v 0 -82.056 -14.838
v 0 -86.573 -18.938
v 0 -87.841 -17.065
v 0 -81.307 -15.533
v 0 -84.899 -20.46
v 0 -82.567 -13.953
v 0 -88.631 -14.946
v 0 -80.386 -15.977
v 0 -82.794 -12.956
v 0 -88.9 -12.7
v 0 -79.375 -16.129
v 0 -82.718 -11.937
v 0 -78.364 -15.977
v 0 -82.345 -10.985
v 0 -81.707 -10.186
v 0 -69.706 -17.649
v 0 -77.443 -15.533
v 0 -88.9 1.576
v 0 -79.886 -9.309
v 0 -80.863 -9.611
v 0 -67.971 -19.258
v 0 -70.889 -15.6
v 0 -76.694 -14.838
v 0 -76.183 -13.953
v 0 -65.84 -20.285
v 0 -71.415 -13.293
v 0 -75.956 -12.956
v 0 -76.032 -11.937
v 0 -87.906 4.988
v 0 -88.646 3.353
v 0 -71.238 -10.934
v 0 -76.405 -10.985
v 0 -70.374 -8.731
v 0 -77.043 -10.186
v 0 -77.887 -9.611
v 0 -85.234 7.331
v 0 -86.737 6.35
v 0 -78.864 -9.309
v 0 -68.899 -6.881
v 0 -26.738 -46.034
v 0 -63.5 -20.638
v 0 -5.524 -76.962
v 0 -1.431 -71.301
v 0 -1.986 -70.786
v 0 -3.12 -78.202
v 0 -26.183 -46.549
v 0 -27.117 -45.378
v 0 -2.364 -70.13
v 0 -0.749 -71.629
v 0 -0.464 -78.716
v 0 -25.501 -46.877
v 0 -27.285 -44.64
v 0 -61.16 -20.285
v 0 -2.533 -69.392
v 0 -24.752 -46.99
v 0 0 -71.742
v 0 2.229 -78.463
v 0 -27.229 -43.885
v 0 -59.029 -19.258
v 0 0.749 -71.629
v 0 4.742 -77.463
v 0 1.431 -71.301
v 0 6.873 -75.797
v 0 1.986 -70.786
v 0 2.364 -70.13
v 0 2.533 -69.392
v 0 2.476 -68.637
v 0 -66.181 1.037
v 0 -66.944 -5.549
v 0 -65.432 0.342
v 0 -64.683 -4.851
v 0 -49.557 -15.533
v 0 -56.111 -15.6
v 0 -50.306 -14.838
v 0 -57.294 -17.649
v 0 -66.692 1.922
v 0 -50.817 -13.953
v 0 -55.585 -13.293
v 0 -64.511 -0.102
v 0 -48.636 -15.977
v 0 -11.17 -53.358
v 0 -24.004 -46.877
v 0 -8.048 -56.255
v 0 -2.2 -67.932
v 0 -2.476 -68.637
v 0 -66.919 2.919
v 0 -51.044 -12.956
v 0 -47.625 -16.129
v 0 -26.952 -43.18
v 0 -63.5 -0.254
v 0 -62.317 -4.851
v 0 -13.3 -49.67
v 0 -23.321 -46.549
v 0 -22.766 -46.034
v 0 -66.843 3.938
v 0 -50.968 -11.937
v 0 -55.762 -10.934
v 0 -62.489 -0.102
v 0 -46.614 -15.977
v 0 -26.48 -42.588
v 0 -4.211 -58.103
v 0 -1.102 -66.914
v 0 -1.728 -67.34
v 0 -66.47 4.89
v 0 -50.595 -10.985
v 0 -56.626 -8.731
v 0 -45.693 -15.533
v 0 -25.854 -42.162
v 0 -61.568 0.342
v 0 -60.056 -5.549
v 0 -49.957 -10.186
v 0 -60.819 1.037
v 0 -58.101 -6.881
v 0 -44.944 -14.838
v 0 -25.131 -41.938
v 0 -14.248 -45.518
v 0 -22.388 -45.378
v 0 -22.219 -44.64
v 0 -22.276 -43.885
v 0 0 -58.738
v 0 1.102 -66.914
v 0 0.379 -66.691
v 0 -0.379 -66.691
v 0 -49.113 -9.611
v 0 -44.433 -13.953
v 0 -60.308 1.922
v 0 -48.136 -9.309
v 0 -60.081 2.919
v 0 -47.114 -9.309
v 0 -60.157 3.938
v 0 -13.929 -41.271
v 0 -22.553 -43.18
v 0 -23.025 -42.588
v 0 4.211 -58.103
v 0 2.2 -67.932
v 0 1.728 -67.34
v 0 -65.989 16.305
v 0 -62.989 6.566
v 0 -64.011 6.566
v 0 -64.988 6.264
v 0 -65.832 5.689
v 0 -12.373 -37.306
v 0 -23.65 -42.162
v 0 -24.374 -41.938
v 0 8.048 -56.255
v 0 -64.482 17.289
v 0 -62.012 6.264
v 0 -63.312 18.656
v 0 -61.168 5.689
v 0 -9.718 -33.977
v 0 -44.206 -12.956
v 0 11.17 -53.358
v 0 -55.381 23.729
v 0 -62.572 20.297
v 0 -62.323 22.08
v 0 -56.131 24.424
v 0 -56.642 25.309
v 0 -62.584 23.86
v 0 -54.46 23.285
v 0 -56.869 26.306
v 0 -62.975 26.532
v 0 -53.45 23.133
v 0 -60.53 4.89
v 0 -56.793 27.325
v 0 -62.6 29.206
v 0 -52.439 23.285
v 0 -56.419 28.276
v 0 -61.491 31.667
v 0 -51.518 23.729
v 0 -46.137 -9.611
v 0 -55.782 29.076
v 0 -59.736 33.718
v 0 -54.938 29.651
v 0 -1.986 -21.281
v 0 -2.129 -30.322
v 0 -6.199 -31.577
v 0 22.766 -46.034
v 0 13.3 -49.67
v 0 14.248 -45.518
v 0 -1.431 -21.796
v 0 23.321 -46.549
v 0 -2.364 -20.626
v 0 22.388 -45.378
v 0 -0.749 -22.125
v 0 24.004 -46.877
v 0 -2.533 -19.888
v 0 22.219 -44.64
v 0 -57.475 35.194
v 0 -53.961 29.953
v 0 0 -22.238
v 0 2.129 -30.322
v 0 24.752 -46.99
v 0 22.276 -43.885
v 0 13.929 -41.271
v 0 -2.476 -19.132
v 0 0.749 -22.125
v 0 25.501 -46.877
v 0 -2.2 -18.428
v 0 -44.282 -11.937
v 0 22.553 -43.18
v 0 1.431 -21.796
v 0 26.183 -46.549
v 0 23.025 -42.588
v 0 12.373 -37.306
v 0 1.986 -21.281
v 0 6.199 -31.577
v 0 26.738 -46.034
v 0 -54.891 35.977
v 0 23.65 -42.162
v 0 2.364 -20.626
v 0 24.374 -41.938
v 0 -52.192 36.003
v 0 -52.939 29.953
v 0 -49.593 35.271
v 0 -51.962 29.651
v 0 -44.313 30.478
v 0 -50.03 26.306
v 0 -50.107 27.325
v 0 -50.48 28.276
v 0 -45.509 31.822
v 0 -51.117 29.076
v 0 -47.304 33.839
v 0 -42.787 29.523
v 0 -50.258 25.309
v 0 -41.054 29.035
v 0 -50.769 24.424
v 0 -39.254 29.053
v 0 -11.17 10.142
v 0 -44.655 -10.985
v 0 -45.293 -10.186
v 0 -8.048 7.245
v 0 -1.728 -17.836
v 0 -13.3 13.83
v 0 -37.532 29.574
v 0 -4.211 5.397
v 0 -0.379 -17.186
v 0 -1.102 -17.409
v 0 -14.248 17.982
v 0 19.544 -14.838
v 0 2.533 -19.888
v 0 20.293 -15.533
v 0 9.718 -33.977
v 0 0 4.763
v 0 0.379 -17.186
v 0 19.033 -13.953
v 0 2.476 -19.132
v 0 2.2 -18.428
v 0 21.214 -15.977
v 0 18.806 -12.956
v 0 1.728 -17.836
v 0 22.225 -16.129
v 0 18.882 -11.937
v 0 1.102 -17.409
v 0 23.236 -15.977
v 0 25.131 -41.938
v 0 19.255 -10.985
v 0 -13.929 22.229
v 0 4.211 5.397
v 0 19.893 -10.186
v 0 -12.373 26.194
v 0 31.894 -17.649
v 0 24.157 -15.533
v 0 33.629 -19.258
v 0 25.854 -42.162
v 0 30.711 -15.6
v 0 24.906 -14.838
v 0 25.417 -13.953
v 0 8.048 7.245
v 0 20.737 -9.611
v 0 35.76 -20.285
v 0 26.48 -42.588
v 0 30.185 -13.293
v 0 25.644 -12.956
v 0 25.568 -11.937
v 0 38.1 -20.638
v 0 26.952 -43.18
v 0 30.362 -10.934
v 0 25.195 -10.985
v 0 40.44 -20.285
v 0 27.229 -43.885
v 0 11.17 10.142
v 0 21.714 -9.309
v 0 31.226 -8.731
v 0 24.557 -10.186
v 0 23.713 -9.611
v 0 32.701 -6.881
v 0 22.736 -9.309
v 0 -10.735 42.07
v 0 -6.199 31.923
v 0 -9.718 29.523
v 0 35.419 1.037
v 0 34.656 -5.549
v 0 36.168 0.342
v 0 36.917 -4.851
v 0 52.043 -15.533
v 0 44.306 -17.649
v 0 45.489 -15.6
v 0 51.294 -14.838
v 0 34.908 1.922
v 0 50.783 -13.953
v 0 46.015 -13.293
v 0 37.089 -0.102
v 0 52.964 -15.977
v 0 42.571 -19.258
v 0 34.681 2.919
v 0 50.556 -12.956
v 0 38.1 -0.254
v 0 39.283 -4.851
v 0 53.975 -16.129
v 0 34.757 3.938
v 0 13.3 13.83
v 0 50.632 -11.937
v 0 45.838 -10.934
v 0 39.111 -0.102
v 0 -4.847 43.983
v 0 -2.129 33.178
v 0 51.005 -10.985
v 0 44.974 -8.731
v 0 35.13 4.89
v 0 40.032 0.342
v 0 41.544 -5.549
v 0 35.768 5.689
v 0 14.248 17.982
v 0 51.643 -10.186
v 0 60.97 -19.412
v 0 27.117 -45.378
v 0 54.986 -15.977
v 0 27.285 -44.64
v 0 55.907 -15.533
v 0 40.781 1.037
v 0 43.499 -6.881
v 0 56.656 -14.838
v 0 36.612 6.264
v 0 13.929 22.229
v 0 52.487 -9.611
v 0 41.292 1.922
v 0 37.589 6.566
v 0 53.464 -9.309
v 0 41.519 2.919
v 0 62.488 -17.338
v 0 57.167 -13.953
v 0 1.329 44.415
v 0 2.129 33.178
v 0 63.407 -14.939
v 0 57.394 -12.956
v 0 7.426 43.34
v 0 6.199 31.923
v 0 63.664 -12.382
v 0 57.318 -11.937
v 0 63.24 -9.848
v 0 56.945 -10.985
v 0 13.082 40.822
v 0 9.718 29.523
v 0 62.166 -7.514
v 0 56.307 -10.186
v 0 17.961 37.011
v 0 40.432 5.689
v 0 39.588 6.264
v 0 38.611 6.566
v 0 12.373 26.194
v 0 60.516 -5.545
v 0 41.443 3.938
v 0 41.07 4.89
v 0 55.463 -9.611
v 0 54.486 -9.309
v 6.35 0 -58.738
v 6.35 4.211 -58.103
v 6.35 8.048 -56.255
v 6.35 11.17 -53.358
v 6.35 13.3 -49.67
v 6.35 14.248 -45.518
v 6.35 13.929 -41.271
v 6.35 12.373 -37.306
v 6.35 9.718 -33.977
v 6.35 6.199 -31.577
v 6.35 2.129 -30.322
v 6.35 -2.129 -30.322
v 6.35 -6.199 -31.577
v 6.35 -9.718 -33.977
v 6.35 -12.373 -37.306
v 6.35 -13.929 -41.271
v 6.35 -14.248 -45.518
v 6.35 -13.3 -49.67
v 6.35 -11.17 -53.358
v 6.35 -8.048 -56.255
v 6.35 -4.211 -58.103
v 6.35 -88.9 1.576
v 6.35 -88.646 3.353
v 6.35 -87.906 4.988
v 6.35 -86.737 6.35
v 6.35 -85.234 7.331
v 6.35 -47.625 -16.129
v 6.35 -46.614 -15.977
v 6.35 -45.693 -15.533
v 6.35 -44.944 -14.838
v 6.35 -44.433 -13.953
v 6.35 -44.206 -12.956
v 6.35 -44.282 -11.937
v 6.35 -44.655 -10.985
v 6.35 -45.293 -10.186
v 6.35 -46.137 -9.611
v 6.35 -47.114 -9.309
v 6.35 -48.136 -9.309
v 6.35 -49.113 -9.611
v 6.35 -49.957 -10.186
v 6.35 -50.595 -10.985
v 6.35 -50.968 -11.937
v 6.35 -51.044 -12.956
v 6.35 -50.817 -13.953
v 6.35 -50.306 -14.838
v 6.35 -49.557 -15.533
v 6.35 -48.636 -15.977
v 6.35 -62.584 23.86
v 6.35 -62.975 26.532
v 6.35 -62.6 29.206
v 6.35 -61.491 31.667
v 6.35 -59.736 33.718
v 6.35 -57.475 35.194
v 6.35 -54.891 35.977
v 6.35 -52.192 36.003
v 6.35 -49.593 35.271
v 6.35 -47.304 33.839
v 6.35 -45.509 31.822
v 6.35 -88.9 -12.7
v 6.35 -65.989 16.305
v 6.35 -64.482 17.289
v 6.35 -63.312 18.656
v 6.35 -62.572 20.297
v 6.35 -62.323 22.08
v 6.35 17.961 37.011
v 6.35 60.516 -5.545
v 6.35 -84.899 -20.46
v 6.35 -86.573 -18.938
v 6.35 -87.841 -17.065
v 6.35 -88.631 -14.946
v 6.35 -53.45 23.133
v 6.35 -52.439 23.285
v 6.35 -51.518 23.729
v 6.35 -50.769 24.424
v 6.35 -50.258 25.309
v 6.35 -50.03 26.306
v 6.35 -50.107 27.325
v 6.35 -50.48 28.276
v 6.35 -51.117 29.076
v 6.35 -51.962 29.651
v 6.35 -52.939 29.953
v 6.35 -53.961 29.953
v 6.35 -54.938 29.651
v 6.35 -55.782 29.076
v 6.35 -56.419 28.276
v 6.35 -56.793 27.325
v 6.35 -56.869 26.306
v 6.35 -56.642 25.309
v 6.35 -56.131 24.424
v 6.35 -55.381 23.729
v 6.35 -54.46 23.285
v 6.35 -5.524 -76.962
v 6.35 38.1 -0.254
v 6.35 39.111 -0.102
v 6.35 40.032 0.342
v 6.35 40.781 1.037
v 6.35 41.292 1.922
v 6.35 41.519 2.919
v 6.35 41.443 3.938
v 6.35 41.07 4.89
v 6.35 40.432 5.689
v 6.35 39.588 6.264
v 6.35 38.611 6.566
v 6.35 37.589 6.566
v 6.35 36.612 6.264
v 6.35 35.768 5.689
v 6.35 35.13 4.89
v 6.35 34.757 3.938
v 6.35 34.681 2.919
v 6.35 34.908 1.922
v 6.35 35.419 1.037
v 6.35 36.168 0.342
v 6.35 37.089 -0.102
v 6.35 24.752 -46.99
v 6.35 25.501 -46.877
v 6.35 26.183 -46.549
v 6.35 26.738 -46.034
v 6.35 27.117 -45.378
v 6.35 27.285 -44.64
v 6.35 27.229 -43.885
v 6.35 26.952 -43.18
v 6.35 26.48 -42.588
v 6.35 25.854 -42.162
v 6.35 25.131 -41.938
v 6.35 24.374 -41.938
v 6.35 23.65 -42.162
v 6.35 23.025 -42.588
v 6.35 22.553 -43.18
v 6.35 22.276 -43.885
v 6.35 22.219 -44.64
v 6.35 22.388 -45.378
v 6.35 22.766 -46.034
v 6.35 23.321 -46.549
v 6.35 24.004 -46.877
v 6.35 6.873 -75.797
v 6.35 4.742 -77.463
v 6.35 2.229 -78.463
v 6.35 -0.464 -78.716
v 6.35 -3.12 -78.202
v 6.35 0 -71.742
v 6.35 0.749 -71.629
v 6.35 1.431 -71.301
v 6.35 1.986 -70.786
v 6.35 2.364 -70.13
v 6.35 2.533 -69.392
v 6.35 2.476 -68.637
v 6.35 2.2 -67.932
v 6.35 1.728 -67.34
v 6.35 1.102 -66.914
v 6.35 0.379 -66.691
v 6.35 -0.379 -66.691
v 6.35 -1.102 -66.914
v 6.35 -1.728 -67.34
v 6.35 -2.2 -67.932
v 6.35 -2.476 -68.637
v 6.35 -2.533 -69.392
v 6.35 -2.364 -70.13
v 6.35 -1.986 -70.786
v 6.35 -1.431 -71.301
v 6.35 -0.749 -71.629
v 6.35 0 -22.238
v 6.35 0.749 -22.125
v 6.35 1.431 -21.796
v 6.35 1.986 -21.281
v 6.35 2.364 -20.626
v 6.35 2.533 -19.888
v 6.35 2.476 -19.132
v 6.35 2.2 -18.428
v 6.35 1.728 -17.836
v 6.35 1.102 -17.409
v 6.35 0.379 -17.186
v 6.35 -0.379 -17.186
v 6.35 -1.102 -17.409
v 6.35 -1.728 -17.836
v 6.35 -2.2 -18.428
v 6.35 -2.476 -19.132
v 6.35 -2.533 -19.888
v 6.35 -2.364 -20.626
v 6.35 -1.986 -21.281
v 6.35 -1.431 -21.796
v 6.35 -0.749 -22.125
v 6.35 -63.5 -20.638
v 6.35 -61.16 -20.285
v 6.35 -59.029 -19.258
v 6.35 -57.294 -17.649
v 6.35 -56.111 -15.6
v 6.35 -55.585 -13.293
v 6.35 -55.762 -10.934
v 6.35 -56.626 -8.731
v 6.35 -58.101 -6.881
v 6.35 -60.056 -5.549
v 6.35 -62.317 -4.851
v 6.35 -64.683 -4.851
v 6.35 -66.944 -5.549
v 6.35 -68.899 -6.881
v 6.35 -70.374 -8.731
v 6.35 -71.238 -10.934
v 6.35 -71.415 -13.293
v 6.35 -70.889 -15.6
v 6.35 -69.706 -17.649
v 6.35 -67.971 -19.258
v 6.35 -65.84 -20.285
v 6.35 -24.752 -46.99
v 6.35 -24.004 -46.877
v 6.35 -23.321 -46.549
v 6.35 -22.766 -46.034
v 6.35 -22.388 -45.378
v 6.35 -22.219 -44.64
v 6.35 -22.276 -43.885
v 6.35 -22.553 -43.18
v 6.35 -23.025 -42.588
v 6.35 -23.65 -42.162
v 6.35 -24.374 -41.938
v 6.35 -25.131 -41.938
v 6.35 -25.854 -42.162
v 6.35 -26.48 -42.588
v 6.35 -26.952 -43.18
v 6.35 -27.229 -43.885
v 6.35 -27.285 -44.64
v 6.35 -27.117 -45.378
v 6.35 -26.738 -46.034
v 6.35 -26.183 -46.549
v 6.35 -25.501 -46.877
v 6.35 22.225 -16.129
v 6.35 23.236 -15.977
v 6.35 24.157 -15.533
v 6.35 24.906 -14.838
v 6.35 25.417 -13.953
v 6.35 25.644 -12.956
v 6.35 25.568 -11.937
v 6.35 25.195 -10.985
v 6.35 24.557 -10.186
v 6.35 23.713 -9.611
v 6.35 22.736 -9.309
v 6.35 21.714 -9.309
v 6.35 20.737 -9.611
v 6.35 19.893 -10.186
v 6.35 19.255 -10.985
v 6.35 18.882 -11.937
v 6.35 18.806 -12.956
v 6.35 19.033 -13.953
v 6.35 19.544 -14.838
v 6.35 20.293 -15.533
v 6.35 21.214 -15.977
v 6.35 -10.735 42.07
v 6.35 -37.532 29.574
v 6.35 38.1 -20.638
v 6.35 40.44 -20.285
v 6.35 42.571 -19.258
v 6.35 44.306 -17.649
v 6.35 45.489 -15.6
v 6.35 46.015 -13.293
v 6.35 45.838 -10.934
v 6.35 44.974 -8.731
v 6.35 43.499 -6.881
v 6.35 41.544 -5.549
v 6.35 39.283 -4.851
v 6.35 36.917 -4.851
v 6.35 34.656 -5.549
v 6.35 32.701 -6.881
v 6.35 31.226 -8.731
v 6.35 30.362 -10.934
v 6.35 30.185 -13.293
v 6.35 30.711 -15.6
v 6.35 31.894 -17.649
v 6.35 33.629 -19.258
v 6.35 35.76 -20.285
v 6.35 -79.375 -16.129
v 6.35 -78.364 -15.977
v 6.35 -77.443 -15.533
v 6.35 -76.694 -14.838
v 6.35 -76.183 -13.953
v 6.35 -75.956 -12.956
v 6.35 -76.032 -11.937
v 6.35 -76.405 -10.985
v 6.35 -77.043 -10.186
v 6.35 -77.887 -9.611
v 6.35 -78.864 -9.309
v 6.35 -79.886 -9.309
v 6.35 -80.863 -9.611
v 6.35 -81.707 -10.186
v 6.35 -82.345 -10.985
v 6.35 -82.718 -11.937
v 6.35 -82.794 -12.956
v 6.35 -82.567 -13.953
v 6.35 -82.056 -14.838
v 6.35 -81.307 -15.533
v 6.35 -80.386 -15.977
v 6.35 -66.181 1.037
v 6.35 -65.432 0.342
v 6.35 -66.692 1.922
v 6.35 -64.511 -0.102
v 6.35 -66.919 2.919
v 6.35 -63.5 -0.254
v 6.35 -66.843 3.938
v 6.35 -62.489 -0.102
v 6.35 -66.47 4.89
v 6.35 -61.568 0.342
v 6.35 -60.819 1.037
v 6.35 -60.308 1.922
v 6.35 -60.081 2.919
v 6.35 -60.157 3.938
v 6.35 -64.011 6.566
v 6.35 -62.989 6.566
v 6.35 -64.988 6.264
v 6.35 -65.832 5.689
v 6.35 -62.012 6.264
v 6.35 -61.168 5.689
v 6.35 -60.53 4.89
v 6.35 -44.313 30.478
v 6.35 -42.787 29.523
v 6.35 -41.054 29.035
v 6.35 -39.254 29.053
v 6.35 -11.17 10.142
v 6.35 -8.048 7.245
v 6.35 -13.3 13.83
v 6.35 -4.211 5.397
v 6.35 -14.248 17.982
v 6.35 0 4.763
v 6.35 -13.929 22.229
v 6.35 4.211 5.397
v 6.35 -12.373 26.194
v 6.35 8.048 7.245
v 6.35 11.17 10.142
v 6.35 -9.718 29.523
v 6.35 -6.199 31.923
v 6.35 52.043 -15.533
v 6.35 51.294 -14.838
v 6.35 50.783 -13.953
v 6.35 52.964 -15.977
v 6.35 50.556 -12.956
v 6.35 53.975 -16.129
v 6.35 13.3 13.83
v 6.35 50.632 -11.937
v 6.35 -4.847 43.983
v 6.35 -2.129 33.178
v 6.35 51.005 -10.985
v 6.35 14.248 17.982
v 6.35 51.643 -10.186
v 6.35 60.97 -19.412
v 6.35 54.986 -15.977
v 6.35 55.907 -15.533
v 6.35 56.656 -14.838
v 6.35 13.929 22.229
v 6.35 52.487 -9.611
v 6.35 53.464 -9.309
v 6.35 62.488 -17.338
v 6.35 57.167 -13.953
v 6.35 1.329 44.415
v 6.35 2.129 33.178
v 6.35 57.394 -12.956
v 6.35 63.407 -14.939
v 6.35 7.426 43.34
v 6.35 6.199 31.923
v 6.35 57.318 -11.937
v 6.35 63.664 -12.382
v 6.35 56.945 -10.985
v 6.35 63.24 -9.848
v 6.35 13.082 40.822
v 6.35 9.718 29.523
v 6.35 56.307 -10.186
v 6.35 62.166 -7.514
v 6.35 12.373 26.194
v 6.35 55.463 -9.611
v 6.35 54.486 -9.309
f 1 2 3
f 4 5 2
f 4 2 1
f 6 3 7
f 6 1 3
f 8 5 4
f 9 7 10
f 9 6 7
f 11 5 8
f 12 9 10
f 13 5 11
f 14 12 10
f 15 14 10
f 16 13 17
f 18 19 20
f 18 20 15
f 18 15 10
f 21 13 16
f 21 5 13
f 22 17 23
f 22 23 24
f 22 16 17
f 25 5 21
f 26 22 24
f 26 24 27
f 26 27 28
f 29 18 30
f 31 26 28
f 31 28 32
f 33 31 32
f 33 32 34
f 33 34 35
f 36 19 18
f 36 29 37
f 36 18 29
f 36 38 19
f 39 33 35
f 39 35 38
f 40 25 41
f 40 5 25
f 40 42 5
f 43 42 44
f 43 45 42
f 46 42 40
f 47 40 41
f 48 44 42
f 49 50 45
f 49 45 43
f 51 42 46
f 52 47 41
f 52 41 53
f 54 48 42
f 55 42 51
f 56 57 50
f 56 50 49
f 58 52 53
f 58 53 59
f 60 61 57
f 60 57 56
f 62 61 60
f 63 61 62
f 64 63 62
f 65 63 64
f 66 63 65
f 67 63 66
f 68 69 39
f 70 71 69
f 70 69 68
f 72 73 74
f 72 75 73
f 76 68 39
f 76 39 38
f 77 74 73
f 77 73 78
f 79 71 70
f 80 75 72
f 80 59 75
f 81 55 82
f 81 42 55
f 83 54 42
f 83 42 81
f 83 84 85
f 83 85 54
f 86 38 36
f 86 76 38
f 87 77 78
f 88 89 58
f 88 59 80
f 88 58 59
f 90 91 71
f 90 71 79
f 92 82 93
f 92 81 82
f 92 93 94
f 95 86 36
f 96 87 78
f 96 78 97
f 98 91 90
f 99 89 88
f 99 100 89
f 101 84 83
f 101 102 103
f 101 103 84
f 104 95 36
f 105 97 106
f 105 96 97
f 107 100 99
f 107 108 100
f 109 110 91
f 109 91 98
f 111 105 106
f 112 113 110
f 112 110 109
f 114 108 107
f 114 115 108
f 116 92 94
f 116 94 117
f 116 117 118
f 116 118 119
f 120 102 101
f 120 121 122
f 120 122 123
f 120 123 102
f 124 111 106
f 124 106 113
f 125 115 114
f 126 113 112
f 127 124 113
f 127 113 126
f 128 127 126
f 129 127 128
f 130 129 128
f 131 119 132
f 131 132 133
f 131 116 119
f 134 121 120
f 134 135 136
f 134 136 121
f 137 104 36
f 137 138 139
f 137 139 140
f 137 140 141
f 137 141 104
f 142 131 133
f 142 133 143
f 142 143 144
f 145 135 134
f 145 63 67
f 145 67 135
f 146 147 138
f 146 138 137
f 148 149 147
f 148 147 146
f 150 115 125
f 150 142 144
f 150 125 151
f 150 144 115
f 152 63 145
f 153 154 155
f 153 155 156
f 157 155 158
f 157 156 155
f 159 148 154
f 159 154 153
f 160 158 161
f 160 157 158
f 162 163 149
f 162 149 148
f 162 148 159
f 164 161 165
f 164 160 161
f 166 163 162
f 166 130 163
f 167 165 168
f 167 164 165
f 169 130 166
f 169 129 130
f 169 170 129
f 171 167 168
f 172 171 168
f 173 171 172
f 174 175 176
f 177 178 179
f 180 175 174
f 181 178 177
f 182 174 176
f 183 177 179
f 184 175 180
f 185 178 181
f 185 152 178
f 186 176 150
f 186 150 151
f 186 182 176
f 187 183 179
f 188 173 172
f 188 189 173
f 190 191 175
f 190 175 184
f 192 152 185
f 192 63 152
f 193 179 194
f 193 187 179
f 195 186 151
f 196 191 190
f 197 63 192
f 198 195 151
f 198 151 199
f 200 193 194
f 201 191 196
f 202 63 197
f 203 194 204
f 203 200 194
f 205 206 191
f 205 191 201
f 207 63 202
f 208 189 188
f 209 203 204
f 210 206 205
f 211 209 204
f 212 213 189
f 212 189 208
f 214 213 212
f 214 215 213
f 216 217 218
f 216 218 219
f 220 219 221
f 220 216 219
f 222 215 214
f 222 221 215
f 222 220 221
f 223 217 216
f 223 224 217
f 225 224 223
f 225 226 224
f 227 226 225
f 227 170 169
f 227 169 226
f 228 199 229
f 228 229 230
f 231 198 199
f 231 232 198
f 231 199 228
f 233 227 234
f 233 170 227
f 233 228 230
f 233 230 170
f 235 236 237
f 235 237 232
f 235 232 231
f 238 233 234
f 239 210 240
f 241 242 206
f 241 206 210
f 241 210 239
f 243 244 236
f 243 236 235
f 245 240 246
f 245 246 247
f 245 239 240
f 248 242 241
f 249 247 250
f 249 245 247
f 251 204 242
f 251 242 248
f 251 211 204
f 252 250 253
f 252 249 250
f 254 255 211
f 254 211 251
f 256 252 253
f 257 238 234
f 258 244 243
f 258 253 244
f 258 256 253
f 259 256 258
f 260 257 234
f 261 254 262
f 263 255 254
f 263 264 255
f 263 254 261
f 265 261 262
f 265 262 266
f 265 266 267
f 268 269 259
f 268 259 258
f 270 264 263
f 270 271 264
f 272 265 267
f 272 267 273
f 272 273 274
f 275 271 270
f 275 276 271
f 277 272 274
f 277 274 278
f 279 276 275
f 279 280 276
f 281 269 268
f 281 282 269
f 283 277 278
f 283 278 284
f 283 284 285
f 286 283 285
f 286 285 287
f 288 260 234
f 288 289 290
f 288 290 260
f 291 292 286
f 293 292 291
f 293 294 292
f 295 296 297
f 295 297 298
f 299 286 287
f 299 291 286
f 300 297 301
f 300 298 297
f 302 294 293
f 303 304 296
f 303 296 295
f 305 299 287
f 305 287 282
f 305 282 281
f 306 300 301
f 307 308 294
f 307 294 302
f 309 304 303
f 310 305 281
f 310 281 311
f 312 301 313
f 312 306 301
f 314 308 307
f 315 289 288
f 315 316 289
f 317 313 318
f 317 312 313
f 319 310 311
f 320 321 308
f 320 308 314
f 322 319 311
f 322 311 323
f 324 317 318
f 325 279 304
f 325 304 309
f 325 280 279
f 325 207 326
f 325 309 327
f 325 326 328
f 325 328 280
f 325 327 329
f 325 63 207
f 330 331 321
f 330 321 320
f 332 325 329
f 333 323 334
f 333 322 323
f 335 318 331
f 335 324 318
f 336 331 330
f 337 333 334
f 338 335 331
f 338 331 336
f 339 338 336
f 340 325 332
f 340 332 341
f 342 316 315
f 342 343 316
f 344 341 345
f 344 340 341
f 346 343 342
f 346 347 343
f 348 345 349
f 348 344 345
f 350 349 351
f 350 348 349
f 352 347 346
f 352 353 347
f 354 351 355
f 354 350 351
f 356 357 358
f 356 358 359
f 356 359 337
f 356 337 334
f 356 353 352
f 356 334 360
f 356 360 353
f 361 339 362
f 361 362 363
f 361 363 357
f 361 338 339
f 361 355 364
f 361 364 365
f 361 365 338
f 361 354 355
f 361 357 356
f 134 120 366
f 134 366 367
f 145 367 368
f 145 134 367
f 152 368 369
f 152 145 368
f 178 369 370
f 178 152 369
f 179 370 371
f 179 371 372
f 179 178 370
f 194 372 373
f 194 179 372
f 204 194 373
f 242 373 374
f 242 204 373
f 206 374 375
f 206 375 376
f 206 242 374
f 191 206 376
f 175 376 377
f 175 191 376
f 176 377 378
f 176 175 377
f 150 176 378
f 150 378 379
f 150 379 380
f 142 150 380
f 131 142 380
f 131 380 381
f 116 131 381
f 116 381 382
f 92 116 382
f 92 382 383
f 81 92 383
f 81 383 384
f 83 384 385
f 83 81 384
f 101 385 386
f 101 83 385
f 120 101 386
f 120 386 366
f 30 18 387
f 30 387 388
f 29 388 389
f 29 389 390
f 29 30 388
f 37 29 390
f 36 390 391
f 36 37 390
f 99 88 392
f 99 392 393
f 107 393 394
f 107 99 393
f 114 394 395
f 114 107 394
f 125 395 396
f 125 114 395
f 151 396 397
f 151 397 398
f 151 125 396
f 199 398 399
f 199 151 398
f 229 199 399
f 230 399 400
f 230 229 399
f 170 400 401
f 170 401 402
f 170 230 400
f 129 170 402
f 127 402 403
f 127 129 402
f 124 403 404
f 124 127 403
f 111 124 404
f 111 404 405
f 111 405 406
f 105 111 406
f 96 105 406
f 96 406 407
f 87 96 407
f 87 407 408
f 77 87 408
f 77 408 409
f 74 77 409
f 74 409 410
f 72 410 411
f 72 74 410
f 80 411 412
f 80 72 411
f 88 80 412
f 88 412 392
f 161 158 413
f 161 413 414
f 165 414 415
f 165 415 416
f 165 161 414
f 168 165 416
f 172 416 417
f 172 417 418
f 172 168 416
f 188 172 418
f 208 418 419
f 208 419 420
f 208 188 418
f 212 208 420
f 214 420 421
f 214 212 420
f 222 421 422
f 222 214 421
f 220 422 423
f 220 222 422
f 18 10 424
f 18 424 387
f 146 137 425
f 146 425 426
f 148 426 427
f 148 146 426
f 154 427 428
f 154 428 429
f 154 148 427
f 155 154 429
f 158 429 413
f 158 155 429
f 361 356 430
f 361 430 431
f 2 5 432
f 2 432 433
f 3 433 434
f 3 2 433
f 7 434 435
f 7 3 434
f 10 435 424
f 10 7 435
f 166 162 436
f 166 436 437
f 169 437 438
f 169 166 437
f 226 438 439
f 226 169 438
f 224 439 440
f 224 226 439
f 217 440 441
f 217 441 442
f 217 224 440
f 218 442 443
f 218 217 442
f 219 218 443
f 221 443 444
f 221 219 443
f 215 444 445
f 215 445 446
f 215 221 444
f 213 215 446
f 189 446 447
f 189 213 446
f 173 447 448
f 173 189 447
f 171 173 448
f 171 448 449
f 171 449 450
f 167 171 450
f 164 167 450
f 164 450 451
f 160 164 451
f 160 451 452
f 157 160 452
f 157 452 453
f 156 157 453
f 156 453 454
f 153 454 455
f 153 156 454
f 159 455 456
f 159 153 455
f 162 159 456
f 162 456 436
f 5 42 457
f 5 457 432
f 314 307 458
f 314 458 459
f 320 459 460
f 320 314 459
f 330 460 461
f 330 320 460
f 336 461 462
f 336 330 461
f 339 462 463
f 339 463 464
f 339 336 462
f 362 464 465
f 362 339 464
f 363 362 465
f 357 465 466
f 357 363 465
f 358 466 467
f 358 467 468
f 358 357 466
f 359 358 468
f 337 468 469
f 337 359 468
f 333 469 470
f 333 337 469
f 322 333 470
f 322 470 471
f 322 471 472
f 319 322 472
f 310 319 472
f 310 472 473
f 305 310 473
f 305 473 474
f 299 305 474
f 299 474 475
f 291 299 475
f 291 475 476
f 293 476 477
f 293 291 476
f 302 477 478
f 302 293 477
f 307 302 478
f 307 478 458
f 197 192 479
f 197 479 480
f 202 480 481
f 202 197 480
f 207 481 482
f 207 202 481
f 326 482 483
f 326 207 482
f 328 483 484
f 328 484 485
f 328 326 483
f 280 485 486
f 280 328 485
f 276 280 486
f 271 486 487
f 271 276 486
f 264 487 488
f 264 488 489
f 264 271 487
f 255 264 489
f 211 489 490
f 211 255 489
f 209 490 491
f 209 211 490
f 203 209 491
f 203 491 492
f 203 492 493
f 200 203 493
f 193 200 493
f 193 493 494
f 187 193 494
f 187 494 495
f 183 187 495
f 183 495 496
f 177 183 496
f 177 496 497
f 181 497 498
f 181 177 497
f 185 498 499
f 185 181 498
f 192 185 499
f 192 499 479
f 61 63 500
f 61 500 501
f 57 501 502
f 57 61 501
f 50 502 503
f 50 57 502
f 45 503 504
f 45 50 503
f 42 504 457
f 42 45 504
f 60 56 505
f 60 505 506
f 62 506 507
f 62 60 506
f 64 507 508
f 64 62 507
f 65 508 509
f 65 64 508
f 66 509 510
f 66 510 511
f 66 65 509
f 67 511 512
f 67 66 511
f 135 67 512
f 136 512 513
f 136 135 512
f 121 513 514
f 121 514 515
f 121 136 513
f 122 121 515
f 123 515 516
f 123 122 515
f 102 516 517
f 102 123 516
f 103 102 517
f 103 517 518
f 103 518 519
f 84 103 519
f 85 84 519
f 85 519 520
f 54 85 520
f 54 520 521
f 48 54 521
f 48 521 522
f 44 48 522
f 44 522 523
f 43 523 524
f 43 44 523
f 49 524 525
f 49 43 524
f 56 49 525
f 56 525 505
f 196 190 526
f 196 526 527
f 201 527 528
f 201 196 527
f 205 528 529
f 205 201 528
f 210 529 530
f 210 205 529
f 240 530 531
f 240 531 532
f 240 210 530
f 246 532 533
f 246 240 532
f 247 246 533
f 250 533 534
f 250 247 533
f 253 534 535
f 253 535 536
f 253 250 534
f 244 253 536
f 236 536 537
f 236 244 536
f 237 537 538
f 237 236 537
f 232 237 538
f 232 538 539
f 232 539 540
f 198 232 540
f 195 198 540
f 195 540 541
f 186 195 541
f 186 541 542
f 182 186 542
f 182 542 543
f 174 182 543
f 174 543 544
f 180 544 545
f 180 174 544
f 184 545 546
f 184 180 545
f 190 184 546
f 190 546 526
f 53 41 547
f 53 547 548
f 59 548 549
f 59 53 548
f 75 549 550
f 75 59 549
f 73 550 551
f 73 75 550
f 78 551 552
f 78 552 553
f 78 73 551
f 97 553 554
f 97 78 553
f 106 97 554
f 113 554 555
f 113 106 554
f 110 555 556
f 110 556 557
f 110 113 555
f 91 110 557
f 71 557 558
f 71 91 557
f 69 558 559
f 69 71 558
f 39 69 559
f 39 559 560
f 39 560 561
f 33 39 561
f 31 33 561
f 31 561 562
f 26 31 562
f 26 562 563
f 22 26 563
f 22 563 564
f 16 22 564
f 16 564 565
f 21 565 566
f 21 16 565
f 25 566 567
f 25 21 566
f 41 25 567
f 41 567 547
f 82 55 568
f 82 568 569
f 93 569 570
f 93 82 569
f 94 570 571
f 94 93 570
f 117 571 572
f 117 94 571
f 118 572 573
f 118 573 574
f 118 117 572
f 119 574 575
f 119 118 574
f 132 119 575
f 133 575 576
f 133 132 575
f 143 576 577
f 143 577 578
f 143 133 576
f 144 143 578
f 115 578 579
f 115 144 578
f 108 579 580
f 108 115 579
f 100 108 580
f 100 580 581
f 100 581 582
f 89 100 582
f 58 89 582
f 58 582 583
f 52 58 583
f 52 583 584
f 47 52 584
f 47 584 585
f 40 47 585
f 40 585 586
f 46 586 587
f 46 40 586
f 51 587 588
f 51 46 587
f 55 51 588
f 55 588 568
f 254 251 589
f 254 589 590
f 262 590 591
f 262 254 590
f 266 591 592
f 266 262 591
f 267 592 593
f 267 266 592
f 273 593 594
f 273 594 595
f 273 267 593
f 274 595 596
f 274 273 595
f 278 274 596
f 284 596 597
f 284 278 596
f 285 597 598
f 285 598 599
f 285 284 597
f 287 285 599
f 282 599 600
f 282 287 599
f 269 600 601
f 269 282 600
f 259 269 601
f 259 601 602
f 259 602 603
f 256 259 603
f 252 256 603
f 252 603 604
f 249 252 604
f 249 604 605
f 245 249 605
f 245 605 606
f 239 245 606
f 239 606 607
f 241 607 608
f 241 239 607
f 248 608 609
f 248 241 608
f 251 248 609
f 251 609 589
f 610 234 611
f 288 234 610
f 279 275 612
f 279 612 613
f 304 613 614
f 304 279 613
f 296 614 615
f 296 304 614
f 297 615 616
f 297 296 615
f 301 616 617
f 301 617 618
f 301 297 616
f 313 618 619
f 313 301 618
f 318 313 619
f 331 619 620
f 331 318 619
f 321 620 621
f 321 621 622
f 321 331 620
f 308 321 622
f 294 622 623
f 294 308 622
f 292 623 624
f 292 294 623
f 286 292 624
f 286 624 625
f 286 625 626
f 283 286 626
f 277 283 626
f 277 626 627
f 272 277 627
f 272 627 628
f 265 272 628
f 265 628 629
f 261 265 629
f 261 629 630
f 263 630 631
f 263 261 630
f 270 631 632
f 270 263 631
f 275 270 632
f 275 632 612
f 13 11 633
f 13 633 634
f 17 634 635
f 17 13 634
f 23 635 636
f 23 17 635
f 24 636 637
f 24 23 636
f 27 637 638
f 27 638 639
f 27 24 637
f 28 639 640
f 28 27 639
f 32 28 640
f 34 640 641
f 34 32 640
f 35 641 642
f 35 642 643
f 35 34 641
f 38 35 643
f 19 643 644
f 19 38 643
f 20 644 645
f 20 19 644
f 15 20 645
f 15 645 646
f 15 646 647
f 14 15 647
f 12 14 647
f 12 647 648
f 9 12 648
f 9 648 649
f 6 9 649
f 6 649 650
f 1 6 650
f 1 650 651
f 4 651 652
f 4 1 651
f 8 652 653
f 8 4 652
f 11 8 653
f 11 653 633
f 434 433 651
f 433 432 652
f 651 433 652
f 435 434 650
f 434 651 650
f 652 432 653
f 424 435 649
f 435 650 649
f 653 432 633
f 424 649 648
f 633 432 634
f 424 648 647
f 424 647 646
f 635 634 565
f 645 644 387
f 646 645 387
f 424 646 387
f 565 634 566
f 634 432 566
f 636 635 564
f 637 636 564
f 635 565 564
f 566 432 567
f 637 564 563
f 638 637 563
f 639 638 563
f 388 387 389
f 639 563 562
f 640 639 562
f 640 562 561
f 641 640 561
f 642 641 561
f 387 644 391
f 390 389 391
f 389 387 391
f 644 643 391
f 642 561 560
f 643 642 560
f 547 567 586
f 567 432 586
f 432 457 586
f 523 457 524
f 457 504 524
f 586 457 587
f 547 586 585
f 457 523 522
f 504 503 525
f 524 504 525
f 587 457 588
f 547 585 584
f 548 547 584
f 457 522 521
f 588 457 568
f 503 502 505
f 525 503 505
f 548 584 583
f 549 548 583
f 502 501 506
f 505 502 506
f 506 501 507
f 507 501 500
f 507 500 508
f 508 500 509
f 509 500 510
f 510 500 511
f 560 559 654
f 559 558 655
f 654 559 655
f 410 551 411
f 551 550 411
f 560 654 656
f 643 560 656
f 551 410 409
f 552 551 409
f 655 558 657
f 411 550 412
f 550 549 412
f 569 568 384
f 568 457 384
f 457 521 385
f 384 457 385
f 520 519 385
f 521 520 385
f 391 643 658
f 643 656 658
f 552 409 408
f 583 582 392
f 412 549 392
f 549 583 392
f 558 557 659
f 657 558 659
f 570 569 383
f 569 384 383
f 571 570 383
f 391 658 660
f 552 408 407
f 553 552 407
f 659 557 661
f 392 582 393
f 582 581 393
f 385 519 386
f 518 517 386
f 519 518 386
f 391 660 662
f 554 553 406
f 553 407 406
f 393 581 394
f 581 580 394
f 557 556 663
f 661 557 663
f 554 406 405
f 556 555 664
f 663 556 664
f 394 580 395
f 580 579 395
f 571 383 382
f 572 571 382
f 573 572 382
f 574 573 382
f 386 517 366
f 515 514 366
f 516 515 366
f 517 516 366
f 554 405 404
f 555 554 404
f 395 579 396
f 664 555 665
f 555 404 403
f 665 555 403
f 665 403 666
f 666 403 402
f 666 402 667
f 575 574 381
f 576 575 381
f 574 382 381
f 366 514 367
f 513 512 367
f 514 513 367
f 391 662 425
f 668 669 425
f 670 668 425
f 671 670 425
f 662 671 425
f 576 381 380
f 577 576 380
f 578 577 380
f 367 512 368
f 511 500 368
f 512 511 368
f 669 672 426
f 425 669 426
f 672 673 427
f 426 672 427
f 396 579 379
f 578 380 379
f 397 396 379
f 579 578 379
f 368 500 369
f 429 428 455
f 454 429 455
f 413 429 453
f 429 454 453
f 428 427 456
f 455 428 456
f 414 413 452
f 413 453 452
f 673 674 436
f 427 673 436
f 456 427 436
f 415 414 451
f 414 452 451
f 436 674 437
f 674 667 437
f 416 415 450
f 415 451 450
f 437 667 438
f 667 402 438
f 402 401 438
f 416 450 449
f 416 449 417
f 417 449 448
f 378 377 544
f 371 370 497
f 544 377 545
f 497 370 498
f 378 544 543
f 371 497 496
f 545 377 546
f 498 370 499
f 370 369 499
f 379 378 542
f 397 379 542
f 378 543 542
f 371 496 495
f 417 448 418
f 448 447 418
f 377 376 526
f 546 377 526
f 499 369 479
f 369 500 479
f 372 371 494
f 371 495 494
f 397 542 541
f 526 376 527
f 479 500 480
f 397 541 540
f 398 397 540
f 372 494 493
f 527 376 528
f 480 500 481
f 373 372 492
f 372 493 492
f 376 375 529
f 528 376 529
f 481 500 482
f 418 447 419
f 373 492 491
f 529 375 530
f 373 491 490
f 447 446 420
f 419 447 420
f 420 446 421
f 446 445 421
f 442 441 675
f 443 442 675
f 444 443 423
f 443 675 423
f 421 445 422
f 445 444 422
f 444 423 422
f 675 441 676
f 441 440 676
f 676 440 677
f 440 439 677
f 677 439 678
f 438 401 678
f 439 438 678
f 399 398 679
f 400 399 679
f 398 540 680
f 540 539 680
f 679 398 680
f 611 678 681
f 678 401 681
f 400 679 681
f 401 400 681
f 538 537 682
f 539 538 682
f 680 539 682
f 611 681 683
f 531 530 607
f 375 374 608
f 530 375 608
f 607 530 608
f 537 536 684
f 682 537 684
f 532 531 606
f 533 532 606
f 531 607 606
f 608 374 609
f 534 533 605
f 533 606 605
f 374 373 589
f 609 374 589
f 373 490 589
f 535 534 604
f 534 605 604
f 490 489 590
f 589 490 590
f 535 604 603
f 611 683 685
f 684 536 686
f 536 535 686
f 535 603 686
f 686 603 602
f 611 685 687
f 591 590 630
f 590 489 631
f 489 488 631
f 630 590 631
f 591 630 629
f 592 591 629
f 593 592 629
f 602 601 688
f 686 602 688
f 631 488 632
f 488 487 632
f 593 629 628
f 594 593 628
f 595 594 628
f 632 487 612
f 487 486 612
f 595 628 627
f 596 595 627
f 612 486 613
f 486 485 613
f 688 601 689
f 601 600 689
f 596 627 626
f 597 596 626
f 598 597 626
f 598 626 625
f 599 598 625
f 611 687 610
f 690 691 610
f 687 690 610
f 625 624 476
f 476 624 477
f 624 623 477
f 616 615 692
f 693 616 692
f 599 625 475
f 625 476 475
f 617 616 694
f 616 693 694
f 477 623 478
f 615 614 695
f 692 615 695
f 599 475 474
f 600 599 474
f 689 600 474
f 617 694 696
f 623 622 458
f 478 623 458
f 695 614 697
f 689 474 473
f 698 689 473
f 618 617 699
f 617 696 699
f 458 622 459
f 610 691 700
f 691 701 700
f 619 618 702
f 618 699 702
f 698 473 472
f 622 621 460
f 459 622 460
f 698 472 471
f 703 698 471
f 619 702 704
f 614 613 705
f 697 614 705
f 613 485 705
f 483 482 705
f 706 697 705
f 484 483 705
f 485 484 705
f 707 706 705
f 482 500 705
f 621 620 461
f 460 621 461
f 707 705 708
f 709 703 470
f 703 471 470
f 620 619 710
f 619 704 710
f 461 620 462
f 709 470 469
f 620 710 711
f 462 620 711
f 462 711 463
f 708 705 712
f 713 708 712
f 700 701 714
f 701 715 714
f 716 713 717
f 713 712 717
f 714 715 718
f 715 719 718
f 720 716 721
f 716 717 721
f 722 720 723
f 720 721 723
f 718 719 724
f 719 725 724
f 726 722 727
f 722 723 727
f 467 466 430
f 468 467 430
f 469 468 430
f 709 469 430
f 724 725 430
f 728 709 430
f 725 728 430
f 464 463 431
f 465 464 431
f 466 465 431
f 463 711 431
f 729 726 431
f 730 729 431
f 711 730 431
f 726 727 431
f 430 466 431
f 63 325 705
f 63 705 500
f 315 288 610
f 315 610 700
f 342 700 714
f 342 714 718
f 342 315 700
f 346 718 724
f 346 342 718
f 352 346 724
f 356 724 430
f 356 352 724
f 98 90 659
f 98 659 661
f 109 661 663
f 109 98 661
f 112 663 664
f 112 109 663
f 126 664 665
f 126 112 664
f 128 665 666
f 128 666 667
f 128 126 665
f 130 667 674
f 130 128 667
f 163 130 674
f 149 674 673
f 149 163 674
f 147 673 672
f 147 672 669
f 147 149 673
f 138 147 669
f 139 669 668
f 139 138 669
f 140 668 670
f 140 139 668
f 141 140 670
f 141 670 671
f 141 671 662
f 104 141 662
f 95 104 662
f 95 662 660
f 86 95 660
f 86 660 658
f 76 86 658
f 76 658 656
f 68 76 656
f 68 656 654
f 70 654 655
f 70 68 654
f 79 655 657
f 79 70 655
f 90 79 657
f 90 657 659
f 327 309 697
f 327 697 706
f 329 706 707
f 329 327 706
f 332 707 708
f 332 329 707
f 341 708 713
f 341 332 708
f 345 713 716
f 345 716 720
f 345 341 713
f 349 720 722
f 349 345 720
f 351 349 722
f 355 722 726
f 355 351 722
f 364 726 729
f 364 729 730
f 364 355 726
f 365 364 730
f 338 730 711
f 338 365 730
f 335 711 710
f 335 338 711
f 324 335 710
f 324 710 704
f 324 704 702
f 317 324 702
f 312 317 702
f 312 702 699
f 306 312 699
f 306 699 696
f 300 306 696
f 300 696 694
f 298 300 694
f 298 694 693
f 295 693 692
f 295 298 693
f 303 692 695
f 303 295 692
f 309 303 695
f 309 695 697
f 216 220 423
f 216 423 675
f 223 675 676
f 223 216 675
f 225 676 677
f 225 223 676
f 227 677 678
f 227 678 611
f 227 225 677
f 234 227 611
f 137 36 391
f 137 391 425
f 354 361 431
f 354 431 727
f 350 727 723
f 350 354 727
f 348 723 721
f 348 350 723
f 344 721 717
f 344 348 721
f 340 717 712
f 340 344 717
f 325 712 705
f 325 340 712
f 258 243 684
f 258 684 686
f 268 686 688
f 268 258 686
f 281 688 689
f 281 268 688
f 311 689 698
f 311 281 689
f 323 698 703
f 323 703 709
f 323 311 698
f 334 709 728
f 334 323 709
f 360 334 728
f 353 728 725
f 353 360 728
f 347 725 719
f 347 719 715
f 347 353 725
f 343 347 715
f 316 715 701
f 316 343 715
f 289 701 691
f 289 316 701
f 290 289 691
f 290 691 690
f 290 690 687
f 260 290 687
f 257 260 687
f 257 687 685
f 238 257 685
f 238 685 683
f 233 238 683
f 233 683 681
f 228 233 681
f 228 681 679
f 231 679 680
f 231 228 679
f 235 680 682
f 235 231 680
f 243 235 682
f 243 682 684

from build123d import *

# Parameters (mm, degrees)
SKETCH1_R           = 14.2875
SKETCH1_R_2         = 7.9375
SKETCH1_R_3         = 3.429
SKETCH1_R_4         = 2.54
BOSS_EXTRUDE1_DEPTH = 6.35


with BuildPart() as part:
    # Sketch1 → Boss-Extrude1 (new body)
    with BuildSketch(Plane(origin=(0, 0, 0), x_dir=(0, 0, -1), z_dir=(1, 0, 0))):
        with BuildLine():
            Line((12.7, -88.9), (-1.575652176, -88.9))
            ThreePointArc((-1.575652176, -88.9), (-4.987504689, -87.905535681), (-7.330706623, -85.233625962))
            Line((-7.330706623, -85.233625962), (-16.304501832, -65.989260033))
            ThreePointArc((-16.304501832, -65.989260033), (-19.450268482, -62.883748133), (-23.860481018, -62.583619201))
            ThreePointArc((-23.860481018, -62.583619201), (-35.194449796, -57.475157953), (-31.822423449, -45.509178558))
            ThreePointArc((-31.822423449, -45.509178558), (-29.217505575, -41.937840594), (-29.574405884, -37.53185896))
            Line((-29.574405884, -37.53185896), (-42.070217791, -10.734503848))
            ThreePointArc((-42.070217791, -10.734503848), (-44.064116927, 4.410663713), (-37.010512242, 17.960512242))
            Line((-37.010512242, 17.960512242), (5.544864644, 60.515889128))
            ThreePointArc((5.544864644, 60.515889128), (12.382451565, 63.66408435), (19.411500847, 60.970351952))
            Line((19.411500847, 60.970351952), (75.796601185, 6.873195536))
            ThreePointArc((75.796601185, 6.873195536), (78.685483549, 0.891546289), (76.962077301, -5.523719874))
            Line((76.962077301, -5.523719874), (20.459777301, -84.898719874))
            ThreePointArc((20.459777301, -84.898719874), (17.065328922, -87.840785752), (12.7, -88.9))
        make_face()
        with Locations((-19.05, 0)):
            Circle(SKETCH1_R, mode=Mode.SUBTRACT)
        with Locations((12.7, 38.1)):
            Circle(SKETCH1_R_2, mode=Mode.SUBTRACT)
        with Locations((12.7, -63.5)):
            Circle(SKETCH1_R_2, mode=Mode.SUBTRACT)
        with Locations((-26.561868124, -53.44971901)):
            Circle(SKETCH1_R_3, mode=Mode.SUBTRACT)
        with Locations((12.7, 53.975)):
            Circle(SKETCH1_R_3, mode=Mode.SUBTRACT)
        with Locations((-3.175, -63.5)):
            Circle(SKETCH1_R_3, mode=Mode.SUBTRACT)
        with Locations((12.7, -47.625)):
            Circle(SKETCH1_R_3, mode=Mode.SUBTRACT)
        with Locations((12.7, -79.375)):
            Circle(SKETCH1_R_3, mode=Mode.SUBTRACT)
        with Locations((-3.175, 38.1)):
            Circle(SKETCH1_R_3, mode=Mode.SUBTRACT)
        with Locations((12.7, 22.225)):
            Circle(SKETCH1_R_3, mode=Mode.SUBTRACT)
        with Locations((44.45, 0)):
            Circle(SKETCH1_R, mode=Mode.SUBTRACT)
        with Locations((44.45, 24.7523)):
            Circle(SKETCH1_R_4, mode=Mode.SUBTRACT)
        with Locations((69.2023, 0)):
            Circle(SKETCH1_R_4, mode=Mode.SUBTRACT)
        with Locations((44.45, -24.7523)):
            Circle(SKETCH1_R_4, mode=Mode.SUBTRACT)
        with Locations((19.6977, 0)):
            Circle(SKETCH1_R_4, mode=Mode.SUBTRACT)
    extrude(amount=BOSS_EXTRUDE1_DEPTH)


solid = part.part
